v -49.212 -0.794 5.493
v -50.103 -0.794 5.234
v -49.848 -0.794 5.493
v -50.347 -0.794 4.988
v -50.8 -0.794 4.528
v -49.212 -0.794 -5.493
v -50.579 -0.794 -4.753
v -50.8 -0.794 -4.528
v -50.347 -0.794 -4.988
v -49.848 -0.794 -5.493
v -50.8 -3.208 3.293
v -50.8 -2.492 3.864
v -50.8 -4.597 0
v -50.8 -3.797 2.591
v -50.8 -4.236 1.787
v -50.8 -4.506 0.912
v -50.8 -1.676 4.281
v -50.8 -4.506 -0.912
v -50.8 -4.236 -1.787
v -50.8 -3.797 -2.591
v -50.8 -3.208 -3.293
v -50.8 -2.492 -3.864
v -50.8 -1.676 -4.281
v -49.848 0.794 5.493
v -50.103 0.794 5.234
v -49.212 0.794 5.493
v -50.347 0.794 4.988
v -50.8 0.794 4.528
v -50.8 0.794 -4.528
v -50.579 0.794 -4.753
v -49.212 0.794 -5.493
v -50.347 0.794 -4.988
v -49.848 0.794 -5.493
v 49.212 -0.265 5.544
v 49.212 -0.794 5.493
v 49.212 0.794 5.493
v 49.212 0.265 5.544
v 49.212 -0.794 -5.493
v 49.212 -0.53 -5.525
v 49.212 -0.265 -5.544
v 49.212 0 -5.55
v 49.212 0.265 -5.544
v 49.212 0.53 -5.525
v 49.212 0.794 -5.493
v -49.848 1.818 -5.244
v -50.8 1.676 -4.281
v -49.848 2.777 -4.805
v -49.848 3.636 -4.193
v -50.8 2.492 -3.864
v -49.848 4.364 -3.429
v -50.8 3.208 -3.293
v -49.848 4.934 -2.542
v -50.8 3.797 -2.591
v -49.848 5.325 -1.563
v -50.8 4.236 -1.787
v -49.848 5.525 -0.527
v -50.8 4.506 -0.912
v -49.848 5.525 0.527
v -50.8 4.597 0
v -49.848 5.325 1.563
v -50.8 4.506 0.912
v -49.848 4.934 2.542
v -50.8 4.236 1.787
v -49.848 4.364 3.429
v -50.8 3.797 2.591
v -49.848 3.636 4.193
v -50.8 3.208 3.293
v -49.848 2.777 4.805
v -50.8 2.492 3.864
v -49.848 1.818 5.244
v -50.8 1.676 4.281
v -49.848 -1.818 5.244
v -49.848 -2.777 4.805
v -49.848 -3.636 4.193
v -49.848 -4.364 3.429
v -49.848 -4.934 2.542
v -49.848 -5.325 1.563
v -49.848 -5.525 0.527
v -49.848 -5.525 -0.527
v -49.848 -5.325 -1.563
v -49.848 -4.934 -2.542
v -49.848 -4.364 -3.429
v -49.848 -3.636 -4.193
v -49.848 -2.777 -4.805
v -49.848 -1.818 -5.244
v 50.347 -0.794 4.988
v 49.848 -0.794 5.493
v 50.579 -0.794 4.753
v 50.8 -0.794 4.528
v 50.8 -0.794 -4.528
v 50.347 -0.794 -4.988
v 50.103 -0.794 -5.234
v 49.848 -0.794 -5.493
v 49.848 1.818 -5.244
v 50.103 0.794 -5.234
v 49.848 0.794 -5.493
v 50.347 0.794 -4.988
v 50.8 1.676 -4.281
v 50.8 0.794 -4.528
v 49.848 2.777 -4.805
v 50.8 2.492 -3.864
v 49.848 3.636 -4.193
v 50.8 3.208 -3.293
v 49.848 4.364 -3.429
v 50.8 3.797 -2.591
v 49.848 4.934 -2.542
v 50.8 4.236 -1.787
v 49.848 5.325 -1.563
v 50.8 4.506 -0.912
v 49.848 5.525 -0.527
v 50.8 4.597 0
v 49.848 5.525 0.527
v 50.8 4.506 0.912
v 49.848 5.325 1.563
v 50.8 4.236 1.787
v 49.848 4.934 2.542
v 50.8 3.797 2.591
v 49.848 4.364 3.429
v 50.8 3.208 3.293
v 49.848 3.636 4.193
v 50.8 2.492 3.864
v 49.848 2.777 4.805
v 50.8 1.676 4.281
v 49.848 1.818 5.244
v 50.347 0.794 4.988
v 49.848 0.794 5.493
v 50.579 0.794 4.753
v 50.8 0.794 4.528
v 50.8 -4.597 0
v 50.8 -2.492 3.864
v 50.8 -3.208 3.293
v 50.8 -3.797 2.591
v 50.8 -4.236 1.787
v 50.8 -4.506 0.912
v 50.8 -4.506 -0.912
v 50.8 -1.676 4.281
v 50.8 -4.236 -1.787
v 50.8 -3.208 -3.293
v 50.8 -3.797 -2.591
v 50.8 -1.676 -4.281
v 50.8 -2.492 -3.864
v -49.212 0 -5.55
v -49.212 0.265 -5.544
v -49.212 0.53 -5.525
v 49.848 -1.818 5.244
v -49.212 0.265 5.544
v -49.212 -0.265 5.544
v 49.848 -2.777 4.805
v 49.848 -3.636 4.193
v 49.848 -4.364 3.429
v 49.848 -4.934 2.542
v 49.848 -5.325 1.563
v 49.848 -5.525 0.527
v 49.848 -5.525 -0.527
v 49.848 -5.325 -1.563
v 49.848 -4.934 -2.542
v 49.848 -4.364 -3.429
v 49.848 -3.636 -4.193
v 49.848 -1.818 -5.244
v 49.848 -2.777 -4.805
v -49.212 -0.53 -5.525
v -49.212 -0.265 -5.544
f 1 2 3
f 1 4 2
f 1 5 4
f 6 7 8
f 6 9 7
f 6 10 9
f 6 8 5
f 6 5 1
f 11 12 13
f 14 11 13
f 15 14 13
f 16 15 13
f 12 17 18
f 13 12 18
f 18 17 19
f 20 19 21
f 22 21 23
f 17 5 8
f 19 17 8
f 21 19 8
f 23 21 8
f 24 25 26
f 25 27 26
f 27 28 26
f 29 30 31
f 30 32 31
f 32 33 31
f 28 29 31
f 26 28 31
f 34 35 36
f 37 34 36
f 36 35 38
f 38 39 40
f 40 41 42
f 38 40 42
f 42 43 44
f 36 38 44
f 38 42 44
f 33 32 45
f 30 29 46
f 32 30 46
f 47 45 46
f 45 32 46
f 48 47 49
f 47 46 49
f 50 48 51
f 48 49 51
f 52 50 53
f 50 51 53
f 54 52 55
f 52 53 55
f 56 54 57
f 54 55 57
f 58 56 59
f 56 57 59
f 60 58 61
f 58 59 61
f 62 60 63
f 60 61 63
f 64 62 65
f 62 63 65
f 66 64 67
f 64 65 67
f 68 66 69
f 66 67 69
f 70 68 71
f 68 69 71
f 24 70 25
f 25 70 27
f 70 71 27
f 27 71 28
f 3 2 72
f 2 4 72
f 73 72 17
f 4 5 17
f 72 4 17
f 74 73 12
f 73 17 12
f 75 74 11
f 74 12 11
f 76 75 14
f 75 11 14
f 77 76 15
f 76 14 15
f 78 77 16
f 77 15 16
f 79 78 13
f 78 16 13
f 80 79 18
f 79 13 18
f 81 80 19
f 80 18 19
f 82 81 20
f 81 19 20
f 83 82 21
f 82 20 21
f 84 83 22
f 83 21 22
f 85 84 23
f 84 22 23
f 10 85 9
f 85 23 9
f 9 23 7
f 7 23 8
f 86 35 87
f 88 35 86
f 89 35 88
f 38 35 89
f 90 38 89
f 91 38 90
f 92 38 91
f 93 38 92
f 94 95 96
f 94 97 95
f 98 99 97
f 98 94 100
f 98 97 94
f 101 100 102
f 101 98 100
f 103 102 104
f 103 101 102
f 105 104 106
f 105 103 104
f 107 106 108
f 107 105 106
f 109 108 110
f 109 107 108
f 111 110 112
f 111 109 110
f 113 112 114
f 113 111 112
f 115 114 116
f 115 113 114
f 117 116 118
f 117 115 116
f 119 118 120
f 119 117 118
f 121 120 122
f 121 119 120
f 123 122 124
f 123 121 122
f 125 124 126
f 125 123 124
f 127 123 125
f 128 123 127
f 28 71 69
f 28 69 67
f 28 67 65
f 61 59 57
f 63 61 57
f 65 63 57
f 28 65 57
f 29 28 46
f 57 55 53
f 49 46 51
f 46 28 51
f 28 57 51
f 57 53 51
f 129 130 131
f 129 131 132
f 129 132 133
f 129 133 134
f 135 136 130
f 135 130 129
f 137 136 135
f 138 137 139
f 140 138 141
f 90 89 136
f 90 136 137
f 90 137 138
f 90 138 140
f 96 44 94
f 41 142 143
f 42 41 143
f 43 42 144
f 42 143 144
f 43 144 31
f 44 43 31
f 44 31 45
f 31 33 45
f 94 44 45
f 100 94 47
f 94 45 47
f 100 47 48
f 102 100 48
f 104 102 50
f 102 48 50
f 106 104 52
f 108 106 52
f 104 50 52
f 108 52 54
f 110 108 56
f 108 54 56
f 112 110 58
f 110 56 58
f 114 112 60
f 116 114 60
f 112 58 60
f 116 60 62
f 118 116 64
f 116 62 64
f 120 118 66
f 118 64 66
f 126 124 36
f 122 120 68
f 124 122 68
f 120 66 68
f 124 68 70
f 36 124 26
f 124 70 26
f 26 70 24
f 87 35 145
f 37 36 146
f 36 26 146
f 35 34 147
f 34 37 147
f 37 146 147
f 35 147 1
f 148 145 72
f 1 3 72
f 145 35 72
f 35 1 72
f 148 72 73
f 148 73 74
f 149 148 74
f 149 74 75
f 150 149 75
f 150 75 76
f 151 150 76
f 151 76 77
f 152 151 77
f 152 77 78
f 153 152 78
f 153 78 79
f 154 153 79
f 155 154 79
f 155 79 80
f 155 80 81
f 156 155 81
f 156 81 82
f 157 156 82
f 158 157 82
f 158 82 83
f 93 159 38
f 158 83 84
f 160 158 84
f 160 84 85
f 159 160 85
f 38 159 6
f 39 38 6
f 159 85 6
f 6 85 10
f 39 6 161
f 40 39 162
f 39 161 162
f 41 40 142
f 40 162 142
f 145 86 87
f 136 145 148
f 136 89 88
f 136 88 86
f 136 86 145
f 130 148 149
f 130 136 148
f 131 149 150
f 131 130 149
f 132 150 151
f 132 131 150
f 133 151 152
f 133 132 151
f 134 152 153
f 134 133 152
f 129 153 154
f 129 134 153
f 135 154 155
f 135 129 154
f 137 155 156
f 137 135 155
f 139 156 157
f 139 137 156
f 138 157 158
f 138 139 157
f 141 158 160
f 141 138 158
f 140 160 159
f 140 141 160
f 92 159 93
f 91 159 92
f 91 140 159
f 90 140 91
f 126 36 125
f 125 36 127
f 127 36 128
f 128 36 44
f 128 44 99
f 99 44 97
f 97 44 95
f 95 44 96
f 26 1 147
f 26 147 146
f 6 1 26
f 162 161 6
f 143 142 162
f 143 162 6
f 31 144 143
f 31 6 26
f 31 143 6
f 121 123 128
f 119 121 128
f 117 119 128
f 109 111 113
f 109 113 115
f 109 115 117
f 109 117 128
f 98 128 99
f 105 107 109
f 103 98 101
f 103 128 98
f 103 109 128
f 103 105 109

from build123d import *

# Parameters (mm, degrees)
BOSS_EXTRUDE1_DEPTH      = 50.8
BOSS_EXTRUDE1_DEPTH_BACK = 50.8
SKETCH2_R                = 5.5499
CHAMFER1_SIZE            = 0.9525
CUT_EXTRUDE1_DEPTH       = 52.402750705
CUT_EXTRUDE1_DEPTH_BACK  = 52.402750705
SKETCH5_W                = 1.5875
SKETCH5_H                = 1.5875


with BuildPart() as part:
    # Sketch2 → Boss-Extrude1 (new, two sides: drawn at the far end of the back side and taken through both)
    with BuildSketch(Plane(origin=(0, 0, 0), x_dir=(0, 0, -1), z_dir=(1, 0, 0)).offset(-BOSS_EXTRUDE1_DEPTH_BACK)):
        Circle(SKETCH2_R)
    extrude(amount=BOSS_EXTRUDE1_DEPTH + BOSS_EXTRUDE1_DEPTH_BACK)

    # Chamfer1
    chamfer1_edges = [part.edges().sort_by_distance(p)[0] for p in [
        (-50.8, 0, 5.5499),
        (50.8, 0, 5.5499),
    ]]
    chamfer(chamfer1_edges, length=CHAMFER1_SIZE)

    # Sketch5 → Cut-Extrude1 (cut, two sides: drawn at the far end of the back side and taken through both)
    with BuildSketch(Plane.XY.offset(-CUT_EXTRUDE1_DEPTH_BACK)):
        with Locations((-50.00625, 0)):
            Rectangle(SKETCH5_W, SKETCH5_H)
        with Locations((50.00625, 0)):
            Rectangle(SKETCH5_W, SKETCH5_H)
    extrude(amount=CUT_EXTRUDE1_DEPTH + CUT_EXTRUDE1_DEPTH_BACK, mode=Mode.SUBTRACT)


solid = part.part
